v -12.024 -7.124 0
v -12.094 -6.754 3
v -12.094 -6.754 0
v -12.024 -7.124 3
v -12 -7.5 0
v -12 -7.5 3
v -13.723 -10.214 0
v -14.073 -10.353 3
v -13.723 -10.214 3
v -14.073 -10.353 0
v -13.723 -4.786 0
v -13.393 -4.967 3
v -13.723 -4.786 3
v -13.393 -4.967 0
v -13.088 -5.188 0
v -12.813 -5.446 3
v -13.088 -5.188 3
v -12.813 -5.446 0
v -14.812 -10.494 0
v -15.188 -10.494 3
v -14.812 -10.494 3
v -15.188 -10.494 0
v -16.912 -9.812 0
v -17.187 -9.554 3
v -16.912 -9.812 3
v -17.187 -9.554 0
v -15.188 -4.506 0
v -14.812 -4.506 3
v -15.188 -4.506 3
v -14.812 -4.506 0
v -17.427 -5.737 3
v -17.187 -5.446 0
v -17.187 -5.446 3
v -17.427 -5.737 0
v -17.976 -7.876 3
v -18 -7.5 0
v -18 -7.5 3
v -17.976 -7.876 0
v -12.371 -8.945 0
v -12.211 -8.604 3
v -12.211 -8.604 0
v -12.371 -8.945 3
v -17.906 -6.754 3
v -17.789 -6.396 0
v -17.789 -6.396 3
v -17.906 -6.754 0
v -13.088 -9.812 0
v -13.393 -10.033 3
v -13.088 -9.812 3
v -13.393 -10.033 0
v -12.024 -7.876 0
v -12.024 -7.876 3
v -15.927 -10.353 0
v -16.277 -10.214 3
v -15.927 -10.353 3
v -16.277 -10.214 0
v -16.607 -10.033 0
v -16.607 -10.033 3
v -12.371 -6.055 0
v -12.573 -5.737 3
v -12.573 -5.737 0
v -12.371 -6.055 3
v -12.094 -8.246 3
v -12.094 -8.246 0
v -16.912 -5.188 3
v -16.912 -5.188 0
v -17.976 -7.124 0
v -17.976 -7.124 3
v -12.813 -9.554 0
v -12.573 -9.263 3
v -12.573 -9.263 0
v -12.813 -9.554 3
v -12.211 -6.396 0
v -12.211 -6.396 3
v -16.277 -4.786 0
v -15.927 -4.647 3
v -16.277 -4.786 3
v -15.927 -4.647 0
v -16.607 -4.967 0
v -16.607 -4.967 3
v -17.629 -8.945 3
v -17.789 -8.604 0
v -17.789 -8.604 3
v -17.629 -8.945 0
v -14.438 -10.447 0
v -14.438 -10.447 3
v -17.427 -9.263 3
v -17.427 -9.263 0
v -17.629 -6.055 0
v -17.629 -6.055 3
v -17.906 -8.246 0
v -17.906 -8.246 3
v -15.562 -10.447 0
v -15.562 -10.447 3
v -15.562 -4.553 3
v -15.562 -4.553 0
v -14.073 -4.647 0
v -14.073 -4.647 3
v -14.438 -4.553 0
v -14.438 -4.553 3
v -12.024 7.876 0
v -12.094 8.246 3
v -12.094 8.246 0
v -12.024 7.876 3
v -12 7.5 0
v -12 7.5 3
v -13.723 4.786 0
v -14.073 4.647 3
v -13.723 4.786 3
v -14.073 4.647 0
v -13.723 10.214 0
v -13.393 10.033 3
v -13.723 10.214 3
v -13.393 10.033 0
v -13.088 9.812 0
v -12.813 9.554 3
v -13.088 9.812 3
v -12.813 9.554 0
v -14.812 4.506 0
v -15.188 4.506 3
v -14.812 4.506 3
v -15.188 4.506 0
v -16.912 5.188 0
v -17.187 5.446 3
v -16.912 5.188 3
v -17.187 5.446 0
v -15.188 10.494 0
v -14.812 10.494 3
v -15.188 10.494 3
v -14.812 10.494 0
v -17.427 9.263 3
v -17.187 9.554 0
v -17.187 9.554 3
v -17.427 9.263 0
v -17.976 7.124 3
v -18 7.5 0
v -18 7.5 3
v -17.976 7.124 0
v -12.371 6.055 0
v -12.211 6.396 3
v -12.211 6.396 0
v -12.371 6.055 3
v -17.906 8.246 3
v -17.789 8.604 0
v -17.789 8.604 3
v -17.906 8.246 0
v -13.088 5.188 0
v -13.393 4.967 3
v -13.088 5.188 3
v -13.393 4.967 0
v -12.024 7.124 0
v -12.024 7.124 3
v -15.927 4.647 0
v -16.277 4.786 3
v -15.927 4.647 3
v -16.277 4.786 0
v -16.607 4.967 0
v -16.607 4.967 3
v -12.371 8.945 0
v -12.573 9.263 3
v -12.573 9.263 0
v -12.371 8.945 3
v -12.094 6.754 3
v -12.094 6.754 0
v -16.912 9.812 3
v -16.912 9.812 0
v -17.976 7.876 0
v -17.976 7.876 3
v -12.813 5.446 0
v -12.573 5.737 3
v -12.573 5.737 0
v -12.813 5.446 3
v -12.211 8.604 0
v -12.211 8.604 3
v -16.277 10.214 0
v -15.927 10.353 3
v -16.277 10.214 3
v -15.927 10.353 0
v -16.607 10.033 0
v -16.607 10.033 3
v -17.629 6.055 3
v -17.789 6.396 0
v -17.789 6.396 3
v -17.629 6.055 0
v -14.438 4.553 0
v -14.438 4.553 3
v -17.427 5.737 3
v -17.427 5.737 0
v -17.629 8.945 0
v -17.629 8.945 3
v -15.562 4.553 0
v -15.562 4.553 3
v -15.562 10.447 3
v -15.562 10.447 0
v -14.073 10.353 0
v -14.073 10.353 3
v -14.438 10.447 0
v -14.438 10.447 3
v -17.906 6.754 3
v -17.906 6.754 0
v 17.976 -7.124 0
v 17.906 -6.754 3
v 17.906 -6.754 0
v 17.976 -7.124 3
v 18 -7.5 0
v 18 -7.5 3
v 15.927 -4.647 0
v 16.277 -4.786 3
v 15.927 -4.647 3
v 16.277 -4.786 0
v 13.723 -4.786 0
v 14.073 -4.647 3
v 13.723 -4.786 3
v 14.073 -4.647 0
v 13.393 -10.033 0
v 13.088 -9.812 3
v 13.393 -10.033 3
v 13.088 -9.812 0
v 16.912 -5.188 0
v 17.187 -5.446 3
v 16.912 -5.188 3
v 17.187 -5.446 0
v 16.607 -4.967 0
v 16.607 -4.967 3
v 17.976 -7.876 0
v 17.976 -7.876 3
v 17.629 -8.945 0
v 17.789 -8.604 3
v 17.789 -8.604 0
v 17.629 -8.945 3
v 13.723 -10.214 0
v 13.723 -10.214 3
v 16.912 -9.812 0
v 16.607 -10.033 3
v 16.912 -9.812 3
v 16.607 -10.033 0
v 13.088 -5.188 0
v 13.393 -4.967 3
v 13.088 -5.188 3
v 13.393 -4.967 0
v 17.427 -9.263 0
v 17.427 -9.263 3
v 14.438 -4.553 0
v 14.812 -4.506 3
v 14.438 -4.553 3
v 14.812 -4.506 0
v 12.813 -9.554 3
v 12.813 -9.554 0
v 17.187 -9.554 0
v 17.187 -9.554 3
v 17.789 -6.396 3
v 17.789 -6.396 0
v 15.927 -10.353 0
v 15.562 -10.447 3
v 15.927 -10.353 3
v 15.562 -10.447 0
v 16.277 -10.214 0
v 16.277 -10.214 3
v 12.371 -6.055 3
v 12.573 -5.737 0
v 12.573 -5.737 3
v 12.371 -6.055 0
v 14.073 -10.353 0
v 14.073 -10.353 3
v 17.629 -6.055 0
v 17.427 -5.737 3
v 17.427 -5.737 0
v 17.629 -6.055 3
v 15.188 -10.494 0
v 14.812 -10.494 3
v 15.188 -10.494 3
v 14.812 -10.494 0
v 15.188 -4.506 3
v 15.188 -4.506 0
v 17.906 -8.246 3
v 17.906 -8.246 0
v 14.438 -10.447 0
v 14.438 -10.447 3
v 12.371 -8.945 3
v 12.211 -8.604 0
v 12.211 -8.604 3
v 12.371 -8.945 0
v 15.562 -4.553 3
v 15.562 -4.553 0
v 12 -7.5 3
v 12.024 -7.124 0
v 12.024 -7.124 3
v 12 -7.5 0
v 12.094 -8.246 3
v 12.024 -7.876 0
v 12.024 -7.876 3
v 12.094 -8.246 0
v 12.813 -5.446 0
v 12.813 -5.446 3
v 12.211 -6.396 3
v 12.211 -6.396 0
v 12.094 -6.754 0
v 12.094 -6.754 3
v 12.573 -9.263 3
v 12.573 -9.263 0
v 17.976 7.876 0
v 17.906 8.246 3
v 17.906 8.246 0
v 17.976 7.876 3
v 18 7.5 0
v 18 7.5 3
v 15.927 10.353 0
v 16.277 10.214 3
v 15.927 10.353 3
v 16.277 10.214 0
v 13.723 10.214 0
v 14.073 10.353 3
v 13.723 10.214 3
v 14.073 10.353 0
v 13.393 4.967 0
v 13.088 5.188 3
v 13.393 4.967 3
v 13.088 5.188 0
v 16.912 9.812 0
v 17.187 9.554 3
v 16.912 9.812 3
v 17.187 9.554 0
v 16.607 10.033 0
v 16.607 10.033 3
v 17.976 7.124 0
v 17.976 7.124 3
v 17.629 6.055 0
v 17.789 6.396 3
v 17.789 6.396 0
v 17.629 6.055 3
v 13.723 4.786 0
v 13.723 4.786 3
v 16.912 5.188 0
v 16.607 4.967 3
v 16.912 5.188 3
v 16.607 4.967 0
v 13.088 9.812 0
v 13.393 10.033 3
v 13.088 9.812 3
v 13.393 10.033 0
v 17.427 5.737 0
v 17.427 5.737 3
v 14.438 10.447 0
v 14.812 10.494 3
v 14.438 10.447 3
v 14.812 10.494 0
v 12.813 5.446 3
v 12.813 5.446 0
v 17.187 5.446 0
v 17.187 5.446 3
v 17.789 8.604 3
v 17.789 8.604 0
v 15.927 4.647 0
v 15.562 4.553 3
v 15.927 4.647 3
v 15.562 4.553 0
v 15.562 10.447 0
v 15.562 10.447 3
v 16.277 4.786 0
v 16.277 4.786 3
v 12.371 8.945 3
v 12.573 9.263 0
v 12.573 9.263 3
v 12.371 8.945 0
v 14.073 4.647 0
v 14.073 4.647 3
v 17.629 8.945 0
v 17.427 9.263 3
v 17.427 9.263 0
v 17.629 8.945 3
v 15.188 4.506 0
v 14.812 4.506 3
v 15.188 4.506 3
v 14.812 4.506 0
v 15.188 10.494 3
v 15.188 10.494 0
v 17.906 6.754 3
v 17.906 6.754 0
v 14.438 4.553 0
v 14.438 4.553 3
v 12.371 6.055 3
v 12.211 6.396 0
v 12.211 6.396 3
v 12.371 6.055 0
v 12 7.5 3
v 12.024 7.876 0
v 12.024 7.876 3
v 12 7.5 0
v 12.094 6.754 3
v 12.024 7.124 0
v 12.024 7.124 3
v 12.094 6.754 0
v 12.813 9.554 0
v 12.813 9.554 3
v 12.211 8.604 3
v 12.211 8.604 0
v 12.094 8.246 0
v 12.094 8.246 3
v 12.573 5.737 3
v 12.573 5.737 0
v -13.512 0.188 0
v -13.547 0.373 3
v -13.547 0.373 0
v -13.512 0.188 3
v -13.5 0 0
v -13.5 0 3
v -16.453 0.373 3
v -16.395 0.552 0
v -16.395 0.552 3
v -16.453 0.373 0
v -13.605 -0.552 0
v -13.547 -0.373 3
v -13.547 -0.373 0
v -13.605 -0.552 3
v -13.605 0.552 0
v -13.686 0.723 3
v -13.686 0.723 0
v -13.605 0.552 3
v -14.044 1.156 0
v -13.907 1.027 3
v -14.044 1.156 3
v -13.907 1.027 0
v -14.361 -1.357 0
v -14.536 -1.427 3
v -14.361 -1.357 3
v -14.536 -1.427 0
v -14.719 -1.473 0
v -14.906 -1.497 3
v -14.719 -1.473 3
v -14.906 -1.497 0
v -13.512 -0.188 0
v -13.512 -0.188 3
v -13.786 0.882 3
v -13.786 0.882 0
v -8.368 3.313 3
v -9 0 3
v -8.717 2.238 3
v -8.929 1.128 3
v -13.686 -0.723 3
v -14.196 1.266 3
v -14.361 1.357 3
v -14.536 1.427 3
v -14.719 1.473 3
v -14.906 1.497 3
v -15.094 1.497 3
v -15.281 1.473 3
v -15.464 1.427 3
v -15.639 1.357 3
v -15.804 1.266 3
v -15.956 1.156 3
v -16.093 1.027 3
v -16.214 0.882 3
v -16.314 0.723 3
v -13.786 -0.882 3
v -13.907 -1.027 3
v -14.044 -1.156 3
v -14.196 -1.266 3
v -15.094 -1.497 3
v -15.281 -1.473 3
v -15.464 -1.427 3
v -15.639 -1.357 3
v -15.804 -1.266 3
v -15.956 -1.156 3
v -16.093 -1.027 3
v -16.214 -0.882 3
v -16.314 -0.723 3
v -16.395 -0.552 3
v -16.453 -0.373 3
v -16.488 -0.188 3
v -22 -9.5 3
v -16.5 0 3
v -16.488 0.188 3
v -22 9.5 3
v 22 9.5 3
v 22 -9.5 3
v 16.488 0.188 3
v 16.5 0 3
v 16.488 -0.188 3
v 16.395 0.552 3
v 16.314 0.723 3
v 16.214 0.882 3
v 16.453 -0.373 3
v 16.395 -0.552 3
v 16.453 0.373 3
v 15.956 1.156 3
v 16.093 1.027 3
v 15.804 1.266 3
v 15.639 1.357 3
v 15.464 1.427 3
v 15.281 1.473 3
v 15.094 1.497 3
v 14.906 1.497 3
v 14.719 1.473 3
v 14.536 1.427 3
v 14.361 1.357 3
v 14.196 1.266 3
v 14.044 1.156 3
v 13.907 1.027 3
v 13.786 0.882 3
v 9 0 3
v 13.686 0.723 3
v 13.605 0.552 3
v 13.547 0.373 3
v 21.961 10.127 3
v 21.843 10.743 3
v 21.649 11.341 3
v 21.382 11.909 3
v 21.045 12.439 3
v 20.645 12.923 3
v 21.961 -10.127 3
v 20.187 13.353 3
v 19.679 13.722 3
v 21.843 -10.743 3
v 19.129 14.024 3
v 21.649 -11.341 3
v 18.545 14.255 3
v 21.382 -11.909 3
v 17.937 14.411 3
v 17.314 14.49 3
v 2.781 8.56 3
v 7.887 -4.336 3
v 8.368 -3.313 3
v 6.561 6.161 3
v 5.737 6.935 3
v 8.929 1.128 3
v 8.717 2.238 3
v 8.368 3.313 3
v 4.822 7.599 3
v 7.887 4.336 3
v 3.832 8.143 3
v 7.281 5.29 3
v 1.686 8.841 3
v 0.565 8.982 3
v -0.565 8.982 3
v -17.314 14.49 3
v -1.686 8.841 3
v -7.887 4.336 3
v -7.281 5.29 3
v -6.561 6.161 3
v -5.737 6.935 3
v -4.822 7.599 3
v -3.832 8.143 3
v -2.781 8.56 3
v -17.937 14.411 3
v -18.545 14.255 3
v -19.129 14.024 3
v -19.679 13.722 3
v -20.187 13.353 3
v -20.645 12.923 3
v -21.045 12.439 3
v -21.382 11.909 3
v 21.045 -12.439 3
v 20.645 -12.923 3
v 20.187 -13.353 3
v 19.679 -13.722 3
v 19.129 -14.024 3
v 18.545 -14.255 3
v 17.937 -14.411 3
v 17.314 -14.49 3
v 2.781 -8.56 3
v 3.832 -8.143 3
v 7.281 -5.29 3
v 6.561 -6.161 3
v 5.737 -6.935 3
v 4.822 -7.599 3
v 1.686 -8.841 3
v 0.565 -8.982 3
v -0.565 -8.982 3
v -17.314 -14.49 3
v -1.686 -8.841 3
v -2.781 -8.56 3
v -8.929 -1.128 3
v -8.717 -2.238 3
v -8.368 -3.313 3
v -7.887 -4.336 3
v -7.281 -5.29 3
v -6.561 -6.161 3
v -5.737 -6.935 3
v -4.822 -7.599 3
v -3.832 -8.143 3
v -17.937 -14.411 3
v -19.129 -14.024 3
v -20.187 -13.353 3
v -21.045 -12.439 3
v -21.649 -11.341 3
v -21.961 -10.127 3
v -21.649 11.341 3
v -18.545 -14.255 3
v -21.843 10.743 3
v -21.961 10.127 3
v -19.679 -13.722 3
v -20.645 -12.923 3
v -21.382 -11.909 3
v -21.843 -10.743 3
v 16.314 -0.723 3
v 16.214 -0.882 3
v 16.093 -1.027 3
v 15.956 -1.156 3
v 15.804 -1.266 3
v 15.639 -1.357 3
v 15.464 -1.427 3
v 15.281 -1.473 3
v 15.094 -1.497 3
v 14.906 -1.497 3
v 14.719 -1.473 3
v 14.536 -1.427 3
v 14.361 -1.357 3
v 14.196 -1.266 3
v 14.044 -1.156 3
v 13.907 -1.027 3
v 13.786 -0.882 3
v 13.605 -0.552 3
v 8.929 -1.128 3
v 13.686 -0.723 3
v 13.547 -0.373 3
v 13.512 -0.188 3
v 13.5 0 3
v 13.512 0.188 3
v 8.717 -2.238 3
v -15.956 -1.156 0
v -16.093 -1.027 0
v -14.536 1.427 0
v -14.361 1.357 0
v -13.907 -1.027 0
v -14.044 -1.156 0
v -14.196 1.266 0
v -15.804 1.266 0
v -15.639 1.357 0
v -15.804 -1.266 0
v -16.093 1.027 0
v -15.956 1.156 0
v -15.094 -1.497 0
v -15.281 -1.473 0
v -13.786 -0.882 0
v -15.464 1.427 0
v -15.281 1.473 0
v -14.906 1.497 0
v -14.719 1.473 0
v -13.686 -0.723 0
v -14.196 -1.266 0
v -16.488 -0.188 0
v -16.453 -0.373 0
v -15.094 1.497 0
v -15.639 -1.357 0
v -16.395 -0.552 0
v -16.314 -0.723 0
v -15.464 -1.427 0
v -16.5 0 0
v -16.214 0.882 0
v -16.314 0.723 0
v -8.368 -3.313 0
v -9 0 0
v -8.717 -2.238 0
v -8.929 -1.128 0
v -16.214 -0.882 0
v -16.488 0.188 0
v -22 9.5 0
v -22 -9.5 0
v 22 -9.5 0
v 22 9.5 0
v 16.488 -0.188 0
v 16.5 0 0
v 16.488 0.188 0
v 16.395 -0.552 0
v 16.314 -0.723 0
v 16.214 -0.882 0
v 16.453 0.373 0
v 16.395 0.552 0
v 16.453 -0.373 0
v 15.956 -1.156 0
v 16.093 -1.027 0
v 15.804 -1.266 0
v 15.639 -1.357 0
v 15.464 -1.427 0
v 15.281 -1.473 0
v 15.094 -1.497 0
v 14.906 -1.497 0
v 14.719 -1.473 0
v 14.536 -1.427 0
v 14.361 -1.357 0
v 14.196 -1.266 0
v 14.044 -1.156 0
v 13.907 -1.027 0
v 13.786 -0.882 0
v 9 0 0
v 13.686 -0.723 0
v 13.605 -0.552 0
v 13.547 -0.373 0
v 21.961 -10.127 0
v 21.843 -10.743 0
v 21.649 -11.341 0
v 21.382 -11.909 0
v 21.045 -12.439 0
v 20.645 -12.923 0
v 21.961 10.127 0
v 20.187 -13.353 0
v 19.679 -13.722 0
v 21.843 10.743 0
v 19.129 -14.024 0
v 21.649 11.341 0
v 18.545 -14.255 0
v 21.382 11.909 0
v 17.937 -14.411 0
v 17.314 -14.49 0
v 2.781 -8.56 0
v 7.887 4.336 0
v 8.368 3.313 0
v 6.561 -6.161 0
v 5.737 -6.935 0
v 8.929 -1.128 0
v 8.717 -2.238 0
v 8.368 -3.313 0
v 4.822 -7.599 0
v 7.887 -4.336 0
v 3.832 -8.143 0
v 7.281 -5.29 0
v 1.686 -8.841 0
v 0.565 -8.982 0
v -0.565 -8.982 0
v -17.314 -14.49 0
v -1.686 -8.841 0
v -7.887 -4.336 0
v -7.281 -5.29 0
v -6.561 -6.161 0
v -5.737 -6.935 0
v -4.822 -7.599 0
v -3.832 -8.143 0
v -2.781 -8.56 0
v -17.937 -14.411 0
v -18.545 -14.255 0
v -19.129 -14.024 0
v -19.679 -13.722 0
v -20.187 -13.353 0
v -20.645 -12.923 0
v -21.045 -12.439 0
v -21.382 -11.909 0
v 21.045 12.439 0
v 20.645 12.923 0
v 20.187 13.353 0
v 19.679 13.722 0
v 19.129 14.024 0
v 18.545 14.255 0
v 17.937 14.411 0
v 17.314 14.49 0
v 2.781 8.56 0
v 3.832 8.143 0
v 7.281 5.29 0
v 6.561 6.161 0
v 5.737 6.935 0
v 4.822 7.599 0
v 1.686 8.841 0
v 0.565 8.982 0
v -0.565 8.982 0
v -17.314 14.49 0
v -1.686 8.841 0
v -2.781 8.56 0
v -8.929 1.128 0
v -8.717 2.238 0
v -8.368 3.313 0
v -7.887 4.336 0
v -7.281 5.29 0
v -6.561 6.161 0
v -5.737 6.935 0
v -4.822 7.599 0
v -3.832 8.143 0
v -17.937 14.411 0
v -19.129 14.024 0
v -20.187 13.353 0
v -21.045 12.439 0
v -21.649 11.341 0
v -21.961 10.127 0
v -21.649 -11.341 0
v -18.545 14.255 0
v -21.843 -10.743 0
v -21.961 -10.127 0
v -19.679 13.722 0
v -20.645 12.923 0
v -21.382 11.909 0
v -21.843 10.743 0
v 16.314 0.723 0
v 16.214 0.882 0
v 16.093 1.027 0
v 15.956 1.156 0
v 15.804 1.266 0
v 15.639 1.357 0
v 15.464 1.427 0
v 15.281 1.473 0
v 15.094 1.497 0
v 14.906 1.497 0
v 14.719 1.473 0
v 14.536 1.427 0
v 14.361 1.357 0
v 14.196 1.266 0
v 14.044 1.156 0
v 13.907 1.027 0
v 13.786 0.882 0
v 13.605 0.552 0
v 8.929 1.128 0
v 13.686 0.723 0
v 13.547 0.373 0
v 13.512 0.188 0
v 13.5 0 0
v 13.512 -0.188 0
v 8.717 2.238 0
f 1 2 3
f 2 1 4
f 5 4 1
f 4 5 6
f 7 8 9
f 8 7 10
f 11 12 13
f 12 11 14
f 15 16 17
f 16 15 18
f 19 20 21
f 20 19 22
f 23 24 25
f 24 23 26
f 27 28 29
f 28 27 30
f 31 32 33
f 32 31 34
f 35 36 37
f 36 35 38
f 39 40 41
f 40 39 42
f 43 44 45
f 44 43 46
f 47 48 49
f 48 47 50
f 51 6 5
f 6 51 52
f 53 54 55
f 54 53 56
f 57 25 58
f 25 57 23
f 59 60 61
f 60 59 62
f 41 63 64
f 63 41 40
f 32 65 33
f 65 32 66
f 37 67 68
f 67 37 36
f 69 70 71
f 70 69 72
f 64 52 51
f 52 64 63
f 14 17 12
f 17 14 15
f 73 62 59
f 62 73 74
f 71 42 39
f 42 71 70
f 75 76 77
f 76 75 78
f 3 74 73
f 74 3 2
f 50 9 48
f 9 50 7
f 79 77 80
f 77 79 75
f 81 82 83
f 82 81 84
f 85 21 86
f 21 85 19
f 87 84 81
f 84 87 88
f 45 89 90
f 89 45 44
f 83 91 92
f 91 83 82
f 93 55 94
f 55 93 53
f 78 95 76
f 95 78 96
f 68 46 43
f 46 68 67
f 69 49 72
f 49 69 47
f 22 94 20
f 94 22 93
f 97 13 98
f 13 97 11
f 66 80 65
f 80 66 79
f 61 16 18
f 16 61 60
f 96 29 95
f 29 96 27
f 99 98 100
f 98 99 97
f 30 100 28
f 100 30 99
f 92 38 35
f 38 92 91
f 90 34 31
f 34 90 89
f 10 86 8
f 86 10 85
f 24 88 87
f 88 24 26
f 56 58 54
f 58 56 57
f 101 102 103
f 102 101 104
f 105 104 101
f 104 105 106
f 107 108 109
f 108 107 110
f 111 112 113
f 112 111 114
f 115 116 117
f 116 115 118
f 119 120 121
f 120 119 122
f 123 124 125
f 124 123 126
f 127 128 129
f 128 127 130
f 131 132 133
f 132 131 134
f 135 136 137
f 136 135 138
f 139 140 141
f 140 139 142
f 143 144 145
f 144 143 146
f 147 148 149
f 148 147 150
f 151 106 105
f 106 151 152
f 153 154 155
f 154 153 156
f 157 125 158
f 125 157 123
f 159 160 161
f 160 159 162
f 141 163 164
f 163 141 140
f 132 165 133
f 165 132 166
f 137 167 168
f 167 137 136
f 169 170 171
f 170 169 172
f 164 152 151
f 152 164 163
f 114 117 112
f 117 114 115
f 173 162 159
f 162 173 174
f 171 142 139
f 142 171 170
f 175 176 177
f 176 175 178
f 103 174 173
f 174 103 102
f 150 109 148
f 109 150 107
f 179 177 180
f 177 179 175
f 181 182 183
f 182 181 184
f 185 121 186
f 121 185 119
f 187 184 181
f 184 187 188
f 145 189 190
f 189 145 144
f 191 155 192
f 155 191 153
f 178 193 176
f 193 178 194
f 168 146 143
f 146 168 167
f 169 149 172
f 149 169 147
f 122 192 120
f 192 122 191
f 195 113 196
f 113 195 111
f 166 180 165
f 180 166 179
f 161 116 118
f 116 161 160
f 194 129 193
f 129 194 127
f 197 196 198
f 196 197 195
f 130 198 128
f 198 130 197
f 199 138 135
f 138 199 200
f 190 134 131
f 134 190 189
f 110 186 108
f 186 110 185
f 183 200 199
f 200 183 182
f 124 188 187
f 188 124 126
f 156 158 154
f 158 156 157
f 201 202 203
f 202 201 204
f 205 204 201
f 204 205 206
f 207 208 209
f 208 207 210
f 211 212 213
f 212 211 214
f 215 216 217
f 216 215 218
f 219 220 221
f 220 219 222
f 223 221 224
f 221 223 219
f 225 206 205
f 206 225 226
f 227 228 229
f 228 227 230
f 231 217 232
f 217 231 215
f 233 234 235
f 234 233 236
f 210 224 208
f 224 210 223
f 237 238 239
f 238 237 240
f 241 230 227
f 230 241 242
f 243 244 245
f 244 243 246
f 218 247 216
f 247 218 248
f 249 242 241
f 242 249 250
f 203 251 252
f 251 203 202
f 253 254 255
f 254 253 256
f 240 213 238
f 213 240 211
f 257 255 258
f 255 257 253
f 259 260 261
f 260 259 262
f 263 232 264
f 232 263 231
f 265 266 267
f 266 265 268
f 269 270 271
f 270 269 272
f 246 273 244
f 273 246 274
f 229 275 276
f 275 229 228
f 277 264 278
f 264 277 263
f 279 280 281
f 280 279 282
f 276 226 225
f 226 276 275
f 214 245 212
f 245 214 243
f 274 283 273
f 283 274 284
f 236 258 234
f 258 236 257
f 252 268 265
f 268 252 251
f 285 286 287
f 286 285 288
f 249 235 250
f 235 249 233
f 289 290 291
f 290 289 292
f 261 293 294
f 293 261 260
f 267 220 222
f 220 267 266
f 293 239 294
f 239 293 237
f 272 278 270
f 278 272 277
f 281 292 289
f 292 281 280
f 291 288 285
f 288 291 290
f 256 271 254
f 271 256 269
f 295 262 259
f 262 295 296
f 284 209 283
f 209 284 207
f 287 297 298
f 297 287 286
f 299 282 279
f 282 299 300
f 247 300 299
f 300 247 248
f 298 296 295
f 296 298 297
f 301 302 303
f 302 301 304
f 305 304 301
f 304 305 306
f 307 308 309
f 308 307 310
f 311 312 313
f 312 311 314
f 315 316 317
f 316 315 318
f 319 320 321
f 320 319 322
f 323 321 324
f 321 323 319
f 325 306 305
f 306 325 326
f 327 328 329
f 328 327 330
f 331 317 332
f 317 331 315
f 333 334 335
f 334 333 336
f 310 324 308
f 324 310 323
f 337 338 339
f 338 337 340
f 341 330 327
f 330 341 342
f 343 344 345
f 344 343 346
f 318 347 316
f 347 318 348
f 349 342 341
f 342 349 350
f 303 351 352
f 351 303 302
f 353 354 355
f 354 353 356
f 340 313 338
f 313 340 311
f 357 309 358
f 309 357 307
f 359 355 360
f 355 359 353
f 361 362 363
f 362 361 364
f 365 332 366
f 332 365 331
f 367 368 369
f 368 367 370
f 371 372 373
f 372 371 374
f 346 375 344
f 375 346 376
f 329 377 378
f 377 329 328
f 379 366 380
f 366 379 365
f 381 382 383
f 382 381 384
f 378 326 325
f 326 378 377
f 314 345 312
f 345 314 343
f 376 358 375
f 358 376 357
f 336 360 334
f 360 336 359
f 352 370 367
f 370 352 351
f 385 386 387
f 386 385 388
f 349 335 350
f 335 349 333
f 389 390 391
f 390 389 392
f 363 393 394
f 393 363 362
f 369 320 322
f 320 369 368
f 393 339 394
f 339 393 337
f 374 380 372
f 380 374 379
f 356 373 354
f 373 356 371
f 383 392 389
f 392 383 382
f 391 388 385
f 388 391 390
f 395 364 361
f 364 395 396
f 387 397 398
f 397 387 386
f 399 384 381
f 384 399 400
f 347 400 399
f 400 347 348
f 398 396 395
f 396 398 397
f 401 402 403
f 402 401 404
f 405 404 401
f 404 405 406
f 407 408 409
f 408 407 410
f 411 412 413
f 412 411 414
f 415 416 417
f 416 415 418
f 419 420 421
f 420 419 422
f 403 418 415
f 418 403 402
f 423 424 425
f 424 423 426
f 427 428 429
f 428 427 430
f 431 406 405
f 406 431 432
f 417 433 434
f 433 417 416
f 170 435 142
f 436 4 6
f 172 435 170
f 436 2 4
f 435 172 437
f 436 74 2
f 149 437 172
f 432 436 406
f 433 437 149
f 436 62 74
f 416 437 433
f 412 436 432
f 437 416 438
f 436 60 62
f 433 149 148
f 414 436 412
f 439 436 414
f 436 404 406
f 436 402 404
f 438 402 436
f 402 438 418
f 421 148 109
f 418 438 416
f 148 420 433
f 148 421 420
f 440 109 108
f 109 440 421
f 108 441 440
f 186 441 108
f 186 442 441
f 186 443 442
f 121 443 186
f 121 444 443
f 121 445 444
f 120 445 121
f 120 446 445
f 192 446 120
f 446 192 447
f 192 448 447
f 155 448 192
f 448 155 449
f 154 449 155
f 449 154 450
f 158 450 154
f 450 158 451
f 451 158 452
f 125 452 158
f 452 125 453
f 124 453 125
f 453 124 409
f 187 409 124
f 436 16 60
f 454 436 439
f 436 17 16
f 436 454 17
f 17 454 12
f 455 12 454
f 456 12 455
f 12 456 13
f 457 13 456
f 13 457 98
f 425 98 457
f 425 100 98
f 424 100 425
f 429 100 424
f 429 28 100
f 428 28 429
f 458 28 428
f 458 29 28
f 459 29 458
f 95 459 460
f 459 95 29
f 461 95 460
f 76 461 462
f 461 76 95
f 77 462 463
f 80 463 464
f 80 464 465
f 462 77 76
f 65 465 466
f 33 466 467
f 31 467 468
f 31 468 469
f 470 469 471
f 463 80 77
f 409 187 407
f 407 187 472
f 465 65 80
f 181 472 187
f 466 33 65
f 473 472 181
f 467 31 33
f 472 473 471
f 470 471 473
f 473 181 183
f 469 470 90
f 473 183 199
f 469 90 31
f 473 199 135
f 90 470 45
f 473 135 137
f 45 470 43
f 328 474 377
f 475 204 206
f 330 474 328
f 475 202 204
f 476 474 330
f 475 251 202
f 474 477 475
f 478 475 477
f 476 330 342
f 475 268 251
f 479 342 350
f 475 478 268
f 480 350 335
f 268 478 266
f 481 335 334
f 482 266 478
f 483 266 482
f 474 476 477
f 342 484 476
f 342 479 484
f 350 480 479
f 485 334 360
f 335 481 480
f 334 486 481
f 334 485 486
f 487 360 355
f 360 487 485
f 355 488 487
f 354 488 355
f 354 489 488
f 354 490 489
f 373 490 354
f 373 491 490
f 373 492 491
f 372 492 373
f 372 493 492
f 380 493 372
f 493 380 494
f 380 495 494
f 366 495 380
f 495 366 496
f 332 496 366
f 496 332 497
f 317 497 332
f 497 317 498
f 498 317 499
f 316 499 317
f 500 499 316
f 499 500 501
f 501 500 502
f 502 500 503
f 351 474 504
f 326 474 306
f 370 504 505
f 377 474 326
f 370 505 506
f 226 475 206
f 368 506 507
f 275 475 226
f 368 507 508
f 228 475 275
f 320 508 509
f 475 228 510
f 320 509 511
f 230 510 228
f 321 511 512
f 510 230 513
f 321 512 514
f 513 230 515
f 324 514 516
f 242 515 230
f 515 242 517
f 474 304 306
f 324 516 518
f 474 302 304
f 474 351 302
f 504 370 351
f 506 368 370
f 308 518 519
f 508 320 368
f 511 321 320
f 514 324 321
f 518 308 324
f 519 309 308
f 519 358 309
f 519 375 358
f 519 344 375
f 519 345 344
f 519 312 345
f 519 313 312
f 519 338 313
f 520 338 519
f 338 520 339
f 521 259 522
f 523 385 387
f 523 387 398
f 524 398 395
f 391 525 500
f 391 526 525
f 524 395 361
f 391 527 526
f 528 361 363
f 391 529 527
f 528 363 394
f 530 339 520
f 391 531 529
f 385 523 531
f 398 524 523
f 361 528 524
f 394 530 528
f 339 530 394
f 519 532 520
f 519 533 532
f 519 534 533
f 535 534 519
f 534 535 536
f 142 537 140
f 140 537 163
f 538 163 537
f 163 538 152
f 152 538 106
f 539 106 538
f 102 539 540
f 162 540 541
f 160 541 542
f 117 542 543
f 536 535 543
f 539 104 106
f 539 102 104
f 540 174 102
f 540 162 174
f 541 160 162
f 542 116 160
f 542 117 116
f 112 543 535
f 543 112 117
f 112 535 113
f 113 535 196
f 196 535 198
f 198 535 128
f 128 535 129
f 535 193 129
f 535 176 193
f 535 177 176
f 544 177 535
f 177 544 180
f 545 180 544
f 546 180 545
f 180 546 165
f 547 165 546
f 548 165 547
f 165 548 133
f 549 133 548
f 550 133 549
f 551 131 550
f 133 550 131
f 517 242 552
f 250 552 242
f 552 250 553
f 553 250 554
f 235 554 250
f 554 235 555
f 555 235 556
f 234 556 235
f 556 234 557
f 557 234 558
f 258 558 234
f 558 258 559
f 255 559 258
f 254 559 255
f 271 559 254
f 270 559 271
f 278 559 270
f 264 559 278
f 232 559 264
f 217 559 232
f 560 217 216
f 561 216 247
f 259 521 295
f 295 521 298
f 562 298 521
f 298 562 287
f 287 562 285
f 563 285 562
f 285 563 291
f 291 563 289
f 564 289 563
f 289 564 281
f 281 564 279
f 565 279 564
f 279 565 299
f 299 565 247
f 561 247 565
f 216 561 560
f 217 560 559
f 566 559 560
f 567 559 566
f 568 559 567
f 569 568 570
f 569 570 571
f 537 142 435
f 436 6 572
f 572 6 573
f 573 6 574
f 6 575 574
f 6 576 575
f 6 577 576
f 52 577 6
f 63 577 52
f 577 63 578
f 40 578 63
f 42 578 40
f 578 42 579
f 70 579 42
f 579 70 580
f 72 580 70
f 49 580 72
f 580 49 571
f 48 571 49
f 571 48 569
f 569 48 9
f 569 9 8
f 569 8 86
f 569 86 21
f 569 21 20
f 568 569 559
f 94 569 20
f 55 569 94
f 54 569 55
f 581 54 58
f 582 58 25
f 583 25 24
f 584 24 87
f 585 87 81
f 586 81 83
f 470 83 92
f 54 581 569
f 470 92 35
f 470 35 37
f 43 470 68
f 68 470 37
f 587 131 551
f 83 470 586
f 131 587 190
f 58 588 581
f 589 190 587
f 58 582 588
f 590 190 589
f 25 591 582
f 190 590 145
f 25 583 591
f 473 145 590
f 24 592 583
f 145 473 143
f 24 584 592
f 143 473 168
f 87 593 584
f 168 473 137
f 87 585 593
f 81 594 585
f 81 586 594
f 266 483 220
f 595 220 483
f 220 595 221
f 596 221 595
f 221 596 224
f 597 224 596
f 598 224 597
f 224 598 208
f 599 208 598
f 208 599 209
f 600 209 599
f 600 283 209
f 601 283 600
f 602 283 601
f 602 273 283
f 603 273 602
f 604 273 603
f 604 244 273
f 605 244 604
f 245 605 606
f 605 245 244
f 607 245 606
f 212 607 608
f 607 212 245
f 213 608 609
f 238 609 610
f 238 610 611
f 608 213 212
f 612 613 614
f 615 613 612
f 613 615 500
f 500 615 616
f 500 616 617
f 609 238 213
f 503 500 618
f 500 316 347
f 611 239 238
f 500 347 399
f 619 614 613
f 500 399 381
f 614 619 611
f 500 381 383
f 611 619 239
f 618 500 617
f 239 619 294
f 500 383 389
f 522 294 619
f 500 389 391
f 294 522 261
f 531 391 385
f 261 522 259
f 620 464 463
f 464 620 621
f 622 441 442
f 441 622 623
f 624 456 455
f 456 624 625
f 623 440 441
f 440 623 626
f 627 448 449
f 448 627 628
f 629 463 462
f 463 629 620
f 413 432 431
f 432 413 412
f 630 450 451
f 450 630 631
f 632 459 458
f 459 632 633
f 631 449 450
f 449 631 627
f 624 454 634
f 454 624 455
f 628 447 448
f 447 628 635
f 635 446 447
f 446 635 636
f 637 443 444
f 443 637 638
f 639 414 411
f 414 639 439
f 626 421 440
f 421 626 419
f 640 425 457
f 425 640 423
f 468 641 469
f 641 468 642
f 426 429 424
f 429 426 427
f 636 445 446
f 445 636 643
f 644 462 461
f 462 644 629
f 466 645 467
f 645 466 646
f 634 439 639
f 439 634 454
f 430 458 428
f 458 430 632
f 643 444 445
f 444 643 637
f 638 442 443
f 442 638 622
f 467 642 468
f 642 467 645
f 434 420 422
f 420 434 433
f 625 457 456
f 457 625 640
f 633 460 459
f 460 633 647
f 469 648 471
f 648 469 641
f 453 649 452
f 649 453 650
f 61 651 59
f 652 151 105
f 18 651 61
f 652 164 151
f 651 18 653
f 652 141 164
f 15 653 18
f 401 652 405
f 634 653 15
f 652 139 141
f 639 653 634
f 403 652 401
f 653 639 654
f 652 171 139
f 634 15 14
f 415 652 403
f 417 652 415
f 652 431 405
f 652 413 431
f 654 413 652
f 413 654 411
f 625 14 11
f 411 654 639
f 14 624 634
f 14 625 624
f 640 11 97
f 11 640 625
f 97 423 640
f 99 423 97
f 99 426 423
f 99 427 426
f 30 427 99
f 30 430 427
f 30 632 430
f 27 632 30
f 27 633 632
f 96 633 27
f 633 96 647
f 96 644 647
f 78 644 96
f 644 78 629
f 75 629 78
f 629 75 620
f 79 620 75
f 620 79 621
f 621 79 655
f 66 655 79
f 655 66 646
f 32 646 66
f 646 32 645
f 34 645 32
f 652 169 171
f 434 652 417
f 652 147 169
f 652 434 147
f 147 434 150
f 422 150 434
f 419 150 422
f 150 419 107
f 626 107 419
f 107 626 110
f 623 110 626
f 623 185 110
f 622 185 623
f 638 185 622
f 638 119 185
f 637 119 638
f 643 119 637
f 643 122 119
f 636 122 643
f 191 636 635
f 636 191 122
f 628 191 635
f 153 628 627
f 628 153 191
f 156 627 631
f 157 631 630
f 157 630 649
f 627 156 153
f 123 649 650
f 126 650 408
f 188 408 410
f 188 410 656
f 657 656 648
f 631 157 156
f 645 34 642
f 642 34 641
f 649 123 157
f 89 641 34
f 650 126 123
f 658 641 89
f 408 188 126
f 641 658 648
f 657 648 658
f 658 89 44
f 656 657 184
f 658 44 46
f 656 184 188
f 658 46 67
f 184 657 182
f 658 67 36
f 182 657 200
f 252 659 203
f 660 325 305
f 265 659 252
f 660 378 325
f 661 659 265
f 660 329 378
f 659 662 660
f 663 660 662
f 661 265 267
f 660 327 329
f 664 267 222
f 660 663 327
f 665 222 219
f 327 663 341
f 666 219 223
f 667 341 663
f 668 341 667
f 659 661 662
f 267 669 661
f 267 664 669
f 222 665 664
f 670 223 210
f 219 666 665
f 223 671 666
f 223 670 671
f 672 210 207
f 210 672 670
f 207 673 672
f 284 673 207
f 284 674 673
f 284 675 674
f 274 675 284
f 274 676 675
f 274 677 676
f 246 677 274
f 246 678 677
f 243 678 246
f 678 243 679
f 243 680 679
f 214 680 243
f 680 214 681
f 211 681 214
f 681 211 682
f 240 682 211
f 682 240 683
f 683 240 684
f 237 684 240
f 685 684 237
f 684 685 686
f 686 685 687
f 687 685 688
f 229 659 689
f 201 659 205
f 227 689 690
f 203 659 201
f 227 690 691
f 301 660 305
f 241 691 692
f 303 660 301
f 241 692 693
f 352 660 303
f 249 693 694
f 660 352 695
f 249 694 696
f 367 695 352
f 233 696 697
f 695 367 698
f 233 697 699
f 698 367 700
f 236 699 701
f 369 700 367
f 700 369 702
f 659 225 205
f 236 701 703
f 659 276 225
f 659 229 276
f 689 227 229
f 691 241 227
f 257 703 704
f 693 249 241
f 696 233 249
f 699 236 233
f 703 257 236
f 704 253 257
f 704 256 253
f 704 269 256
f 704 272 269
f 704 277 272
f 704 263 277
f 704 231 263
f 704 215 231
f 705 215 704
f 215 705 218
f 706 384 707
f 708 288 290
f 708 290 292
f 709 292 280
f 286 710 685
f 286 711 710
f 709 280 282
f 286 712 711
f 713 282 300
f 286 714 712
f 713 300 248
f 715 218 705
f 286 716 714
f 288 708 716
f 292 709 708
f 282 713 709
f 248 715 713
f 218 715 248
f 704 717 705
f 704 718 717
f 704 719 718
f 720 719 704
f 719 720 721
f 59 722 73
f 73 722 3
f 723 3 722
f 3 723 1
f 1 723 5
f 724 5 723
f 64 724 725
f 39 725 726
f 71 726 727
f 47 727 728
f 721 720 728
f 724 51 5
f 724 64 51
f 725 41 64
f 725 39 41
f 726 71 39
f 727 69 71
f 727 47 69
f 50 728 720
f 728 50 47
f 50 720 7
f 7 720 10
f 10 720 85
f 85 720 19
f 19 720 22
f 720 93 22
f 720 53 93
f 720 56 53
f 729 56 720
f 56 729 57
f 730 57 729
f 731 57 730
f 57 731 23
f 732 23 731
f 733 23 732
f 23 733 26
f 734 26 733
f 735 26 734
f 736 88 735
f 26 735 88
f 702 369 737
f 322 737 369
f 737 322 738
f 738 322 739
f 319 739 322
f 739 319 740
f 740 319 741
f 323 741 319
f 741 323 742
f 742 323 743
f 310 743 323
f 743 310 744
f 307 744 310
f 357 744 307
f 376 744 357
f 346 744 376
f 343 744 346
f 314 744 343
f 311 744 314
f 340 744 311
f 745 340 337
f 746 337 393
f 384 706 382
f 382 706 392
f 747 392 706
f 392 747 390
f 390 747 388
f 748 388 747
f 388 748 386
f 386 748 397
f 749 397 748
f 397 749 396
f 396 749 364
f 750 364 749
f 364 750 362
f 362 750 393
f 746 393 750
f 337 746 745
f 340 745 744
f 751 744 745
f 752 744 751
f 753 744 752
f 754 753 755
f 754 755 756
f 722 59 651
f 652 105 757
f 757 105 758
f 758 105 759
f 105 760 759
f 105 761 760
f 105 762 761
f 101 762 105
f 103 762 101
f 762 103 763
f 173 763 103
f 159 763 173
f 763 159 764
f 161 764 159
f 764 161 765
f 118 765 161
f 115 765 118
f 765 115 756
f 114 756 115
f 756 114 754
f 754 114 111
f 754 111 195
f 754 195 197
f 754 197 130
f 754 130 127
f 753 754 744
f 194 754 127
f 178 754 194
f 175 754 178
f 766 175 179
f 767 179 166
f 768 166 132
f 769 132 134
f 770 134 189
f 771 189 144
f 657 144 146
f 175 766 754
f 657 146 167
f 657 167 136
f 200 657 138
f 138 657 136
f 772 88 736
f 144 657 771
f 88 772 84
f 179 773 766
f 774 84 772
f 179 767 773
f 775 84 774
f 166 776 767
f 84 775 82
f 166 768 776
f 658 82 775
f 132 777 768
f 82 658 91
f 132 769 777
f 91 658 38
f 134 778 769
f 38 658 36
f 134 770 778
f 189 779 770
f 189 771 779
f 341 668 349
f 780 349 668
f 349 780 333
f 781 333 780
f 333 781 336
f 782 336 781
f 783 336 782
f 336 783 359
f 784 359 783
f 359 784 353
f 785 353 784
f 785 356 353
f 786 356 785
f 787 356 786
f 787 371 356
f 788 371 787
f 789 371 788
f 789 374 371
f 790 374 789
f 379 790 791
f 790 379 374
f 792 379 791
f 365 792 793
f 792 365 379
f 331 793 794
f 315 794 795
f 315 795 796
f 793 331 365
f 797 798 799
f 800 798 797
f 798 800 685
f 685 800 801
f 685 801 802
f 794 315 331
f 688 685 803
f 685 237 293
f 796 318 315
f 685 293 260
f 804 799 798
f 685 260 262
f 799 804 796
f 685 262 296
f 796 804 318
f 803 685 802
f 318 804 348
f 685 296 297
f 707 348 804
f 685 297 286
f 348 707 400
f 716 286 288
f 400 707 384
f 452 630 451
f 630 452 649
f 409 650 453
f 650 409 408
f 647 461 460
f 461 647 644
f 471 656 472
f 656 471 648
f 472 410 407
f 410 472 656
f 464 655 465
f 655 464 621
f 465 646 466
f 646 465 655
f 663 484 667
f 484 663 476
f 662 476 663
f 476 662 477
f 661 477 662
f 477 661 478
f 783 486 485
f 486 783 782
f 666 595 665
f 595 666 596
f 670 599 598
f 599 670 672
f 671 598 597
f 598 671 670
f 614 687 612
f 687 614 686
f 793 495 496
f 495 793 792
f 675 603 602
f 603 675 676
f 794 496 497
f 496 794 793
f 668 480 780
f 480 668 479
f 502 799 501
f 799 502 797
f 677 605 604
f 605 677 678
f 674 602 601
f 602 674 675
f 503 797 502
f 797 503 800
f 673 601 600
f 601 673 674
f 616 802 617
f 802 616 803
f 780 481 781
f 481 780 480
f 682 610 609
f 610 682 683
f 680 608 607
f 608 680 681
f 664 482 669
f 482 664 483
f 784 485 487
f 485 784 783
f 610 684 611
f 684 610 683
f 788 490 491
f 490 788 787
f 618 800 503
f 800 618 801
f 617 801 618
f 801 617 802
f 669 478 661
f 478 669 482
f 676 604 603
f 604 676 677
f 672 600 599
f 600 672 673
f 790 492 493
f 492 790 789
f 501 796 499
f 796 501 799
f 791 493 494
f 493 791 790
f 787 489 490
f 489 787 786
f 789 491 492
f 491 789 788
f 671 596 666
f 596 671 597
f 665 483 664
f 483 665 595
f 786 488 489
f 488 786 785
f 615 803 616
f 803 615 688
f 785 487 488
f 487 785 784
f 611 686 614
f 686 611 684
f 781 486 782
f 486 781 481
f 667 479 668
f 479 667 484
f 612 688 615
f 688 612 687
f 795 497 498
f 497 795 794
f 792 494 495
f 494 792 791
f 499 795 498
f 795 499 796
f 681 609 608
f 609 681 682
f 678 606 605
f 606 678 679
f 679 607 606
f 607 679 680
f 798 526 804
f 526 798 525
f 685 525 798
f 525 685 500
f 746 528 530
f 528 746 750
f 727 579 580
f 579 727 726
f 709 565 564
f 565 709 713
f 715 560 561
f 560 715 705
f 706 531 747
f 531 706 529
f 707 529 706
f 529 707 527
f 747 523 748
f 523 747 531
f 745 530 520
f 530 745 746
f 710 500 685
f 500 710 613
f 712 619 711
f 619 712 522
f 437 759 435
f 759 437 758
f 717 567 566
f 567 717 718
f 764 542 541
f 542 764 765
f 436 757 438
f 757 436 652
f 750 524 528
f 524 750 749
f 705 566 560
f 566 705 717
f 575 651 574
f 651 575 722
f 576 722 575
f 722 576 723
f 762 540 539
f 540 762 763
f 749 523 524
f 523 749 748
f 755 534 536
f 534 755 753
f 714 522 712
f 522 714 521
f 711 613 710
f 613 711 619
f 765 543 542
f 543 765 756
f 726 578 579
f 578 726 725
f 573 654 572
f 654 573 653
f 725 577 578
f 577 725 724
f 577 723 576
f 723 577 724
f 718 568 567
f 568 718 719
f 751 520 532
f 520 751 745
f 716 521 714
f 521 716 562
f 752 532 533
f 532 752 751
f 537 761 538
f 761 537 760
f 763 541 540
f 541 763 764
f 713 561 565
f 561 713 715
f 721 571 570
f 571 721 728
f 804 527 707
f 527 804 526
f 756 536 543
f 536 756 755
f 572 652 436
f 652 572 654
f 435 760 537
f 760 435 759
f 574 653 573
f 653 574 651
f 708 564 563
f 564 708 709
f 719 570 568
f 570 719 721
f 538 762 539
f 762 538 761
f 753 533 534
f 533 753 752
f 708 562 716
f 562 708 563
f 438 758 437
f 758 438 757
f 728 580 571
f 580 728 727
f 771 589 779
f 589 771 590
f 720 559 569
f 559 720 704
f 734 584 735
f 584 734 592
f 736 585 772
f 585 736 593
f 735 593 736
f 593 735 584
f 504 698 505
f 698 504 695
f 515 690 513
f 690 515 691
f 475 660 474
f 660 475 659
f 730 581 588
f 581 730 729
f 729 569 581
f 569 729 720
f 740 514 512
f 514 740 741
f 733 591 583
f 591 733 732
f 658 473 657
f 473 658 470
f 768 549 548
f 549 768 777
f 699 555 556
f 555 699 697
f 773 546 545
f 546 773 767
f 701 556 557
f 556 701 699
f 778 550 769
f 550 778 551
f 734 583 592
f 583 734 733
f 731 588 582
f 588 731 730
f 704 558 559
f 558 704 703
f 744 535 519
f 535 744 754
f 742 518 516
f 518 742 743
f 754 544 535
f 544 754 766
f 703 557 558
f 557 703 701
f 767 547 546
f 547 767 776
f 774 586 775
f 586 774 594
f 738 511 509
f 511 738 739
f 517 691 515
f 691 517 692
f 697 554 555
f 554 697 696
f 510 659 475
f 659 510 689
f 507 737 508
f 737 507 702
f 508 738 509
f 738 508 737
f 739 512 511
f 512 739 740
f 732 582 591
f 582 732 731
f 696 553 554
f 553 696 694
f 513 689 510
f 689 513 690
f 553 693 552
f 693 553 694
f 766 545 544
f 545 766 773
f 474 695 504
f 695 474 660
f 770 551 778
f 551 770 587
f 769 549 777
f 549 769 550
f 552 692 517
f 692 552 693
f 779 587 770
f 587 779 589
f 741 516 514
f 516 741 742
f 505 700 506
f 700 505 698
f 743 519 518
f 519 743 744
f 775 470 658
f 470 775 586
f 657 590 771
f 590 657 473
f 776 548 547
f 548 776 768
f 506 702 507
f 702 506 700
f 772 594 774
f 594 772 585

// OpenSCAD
$fn = 50;


difference() {
	union() {
		hull() {
			translate(v = [-17.0000000000, 9.5000000000, 0]) {
				cylinder(h = 3, r = 5);
			}
			translate(v = [17.0000000000, 9.5000000000, 0]) {
				cylinder(h = 3, r = 5);
			}
			translate(v = [-17.0000000000, -9.5000000000, 0]) {
				cylinder(h = 3, r = 5);
			}
			translate(v = [17.0000000000, -9.5000000000, 0]) {
				cylinder(h = 3, r = 5);
			}
		}
	}
	union() {
		#translate(v = [-15.0000000000, -7.5000000000, 0]) {
			cylinder(h = 3, r = 3.0000000000);
		}
		#translate(v = [-15.0000000000, 7.5000000000, 0]) {
			cylinder(h = 3, r = 3.0000000000);
		}
		#translate(v = [15.0000000000, -7.5000000000, 0]) {
			cylinder(h = 3, r = 3.0000000000);
		}
		#translate(v = [15.0000000000, 7.5000000000, 0]) {
			cylinder(h = 3, r = 3.0000000000);
		}
		#translate(v = [-15.0000000000, -7.5000000000, -100.0000000000]) {
			cylinder(h = 200, r = 3.0000000000);
		}
		#translate(v = [-15.0000000000, 7.5000000000, -100.0000000000]) {
			cylinder(h = 200, r = 3.0000000000);
		}
		#translate(v = [15.0000000000, -7.5000000000, -100.0000000000]) {
			cylinder(h = 200, r = 3.0000000000);
		}
		#translate(v = [15.0000000000, 7.5000000000, -100.0000000000]) {
			cylinder(h = 200, r = 3.0000000000);
		}
		#translate(v = [-15.0000000000, -7.5000000000, 0]) {
			cylinder(h = 3, r = 1.5000000000);
		}
		#translate(v = [-15.0000000000, 0.0000000000, 0]) {
			cylinder(h = 3, r = 1.5000000000);
		}
		#translate(v = [-15.0000000000, 7.5000000000, 0]) {
			cylinder(h = 3, r = 1.5000000000);
		}
		#translate(v = [15.0000000000, -7.5000000000, 0]) {
			cylinder(h = 3, r = 1.5000000000);
		}
		#translate(v = [15.0000000000, 0.0000000000, 0]) {
			cylinder(h = 3, r = 1.5000000000);
		}
		#translate(v = [15.0000000000, 7.5000000000, 0]) {
			cylinder(h = 3, r = 1.5000000000);
		}
		#translate(v = [-15.0000000000, -7.5000000000, 0]) {
			cylinder(h = 3, r = 1.5000000000);
		}
		#translate(v = [-15.0000000000, 0.0000000000, 0]) {
			cylinder(h = 3, r = 1.5000000000);
		}
		#translate(v = [-15.0000000000, 7.5000000000, 0]) {
			cylinder(h = 3, r = 1.5000000000);
		}
		#translate(v = [15.0000000000, -7.5000000000, 0]) {
			cylinder(h = 3, r = 1.5000000000);
		}
		#translate(v = [15.0000000000, 0.0000000000, 0]) {
			cylinder(h = 3, r = 1.5000000000);
		}
		#translate(v = [15.0000000000, 7.5000000000, 0]) {
			cylinder(h = 3, r = 1.5000000000);
		}
		#translate(v = [-15.0000000000, -7.5000000000, 0]) {
			cylinder(h = 3, r = 1.5000000000);
		}
		#translate(v = [-15.0000000000, 0.0000000000, 0]) {
			cylinder(h = 3, r = 1.5000000000);
		}
		#translate(v = [-15.0000000000, 7.5000000000, 0]) {
			cylinder(h = 3, r = 1.5000000000);
		}
		#translate(v = [15.0000000000, -7.5000000000, 0]) {
			cylinder(h = 3, r = 1.5000000000);
		}
		#translate(v = [15.0000000000, 0.0000000000, 0]) {
			cylinder(h = 3, r = 1.5000000000);
		}
		#translate(v = [15.0000000000, 7.5000000000, 0]) {
			cylinder(h = 3, r = 1.5000000000);
		}
		#cylinder(h = 3, r = 9.0000000000);
	}
}
